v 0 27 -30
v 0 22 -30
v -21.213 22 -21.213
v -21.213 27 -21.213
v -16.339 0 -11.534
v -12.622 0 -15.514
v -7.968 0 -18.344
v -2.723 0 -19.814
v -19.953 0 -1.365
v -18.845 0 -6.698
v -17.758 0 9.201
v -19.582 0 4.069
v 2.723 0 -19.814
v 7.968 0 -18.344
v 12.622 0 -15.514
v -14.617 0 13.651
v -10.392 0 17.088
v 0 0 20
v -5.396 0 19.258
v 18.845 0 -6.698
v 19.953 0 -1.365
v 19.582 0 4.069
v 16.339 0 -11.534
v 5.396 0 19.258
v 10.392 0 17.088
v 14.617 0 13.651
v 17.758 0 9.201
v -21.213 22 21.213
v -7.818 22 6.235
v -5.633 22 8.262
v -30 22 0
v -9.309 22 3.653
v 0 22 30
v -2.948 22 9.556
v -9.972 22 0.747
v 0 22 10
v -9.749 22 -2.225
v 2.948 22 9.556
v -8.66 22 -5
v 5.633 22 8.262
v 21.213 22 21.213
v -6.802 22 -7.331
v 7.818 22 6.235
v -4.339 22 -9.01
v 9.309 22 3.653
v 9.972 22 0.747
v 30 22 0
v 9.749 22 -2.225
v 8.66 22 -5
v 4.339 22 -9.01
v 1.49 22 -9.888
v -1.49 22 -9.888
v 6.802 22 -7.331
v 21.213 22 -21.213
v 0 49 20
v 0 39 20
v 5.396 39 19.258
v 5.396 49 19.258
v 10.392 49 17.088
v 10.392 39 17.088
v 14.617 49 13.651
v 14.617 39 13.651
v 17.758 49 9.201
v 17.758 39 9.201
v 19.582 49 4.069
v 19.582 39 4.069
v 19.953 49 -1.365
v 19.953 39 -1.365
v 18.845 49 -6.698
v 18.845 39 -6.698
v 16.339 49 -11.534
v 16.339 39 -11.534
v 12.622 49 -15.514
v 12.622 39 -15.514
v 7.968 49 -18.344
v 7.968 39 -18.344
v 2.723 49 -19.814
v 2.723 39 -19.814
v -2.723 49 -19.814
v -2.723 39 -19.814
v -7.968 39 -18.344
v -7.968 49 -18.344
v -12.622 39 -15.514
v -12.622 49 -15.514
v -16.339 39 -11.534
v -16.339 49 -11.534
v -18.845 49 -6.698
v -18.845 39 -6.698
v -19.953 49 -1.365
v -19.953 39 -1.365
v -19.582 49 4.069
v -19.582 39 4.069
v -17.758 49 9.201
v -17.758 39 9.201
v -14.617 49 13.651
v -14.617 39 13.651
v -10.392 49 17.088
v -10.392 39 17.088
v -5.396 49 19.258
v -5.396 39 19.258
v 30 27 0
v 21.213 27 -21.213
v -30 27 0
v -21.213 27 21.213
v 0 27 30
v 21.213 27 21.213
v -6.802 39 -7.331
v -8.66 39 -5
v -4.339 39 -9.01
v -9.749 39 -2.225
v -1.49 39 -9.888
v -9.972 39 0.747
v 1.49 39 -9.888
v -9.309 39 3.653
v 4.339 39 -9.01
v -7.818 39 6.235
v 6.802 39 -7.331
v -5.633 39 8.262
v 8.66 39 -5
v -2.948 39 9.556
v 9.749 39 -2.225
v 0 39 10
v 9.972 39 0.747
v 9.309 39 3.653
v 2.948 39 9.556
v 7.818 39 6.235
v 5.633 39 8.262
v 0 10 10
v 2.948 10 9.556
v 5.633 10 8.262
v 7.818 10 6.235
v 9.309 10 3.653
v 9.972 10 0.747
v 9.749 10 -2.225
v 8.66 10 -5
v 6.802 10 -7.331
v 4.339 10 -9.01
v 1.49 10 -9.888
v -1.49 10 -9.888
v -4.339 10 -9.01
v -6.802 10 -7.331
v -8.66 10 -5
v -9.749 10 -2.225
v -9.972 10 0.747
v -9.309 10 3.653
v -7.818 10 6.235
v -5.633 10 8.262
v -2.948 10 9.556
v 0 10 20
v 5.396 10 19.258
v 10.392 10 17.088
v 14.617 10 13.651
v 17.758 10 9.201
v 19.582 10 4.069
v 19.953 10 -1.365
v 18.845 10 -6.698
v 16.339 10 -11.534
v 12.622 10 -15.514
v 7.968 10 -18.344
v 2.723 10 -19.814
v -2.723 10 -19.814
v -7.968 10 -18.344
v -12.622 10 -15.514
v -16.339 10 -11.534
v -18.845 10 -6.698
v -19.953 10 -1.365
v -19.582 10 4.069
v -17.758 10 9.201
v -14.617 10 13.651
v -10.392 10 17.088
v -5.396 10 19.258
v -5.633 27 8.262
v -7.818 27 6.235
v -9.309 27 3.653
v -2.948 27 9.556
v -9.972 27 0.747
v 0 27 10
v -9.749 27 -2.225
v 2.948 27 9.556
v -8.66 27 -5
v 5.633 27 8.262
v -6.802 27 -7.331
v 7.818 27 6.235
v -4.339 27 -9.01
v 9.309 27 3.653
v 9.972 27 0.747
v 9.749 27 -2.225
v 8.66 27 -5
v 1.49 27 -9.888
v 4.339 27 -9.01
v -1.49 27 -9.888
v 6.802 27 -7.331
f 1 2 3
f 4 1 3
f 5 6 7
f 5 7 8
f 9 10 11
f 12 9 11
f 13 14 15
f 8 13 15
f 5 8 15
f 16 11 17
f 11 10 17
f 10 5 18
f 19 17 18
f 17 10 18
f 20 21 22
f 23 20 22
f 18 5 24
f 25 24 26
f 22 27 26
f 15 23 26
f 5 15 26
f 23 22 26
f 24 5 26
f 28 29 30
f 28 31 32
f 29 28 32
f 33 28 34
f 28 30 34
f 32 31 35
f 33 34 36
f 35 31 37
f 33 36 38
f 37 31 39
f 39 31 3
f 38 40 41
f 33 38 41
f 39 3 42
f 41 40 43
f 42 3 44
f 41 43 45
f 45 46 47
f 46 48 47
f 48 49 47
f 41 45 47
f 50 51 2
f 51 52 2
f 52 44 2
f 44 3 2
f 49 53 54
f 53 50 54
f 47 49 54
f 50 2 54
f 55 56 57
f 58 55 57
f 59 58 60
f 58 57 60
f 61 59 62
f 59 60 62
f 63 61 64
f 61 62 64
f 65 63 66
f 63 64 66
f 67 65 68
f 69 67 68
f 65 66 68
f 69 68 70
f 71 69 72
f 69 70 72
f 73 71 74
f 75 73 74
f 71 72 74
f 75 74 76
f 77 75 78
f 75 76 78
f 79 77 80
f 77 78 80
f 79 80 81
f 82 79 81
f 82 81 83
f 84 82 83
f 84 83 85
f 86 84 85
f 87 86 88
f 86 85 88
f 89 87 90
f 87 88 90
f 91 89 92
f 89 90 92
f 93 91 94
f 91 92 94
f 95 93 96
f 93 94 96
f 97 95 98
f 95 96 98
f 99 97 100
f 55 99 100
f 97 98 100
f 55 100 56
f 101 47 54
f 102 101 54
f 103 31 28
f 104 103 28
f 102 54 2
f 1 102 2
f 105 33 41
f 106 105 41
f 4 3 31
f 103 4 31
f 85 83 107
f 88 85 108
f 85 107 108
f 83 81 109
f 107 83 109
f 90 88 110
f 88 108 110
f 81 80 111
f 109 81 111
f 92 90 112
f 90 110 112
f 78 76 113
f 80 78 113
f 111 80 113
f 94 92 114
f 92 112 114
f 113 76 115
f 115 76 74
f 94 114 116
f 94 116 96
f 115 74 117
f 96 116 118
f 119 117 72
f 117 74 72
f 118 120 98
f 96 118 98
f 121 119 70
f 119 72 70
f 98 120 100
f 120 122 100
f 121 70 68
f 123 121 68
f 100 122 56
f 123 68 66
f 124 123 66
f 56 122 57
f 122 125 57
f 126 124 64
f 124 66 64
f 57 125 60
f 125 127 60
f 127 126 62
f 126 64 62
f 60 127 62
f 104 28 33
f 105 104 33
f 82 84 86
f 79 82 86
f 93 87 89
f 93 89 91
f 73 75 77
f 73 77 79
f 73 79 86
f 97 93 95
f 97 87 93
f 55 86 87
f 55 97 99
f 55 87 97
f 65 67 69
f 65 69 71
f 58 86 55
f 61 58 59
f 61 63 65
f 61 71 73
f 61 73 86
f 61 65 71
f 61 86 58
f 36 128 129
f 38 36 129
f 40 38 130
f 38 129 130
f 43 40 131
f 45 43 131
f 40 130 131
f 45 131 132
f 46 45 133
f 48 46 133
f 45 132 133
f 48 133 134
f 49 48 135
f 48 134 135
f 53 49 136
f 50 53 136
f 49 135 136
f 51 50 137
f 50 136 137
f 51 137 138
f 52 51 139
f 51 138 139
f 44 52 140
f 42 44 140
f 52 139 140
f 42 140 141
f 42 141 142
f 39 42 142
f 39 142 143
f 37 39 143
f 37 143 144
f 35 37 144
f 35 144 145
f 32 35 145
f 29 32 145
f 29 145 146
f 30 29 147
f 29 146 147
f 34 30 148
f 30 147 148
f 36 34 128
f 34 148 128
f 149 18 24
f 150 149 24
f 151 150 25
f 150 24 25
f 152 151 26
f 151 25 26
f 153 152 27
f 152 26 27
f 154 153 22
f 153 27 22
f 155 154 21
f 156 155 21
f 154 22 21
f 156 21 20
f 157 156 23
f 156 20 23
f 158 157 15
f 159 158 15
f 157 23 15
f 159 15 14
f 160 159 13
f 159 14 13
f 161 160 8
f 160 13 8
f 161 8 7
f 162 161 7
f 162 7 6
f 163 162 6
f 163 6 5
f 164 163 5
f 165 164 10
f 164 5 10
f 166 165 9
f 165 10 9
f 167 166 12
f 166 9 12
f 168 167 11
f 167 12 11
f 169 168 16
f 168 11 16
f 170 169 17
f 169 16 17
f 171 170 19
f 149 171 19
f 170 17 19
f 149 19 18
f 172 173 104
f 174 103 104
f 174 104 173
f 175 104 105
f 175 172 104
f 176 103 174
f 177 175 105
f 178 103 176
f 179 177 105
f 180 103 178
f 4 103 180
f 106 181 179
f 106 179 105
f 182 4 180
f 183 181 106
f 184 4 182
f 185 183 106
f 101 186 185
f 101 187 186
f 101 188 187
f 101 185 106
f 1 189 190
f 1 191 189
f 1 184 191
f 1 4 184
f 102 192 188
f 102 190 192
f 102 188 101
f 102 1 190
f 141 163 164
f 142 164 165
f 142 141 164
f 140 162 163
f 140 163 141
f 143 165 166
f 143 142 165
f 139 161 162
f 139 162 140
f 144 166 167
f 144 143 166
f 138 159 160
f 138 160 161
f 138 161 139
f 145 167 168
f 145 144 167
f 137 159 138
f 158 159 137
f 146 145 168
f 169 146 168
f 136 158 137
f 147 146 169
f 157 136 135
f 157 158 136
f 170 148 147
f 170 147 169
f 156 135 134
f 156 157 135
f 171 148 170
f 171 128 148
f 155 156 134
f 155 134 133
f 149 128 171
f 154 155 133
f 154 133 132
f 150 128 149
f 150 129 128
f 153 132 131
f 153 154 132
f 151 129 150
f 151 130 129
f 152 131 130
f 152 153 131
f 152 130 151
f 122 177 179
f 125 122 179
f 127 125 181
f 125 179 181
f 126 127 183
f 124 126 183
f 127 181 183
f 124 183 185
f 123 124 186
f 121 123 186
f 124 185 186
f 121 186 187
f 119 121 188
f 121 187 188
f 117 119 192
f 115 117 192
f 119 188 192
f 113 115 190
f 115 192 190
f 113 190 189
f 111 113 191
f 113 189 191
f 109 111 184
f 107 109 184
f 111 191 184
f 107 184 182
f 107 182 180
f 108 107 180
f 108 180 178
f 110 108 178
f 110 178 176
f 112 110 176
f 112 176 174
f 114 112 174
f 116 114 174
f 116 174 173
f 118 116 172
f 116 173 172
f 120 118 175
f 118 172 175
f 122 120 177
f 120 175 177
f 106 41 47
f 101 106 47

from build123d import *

# Parameters (mm, degrees)
SKETCH2_R           = 20
BOSS_EXTRUDE1_DEPTH = 10
SKETCH3_R           = 10
BOSS_EXTRUDE2_DEPTH = 12
BOSS_EXTRUDE3_DEPTH = 5
SKETCH5_R           = 10
BOSS_EXTRUDE4_DEPTH = 12
SKETCH6_R           = 20
BOSS_EXTRUDE5_DEPTH = 10


with BuildPart() as part:
    # Sketch2 → Boss-Extrude1 (new body)
    with BuildSketch(Plane(origin=(0, 0, 0), x_dir=(1, 0, 0), z_dir=(0, 1, 0))):
        with Locations(Location((0, 0, 0), (0, 0, 270))):
            Circle(SKETCH2_R)
    extrude(amount=BOSS_EXTRUDE1_DEPTH)

    # Sketch3 → Boss-Extrude2 (add)
    with BuildSketch(Plane(origin=(0, 10, 0), x_dir=(1, 0, 0), z_dir=(0, 1, 0))):
        with Locations(Location((0, 0, 0), (0, 0, 270))):
            Circle(SKETCH3_R)
    extrude(amount=BOSS_EXTRUDE2_DEPTH)

    # Sketch4 → Boss-Extrude3 (add)
    with BuildSketch(Plane(origin=(0, 22, 0), x_dir=(1, 0, 0), z_dir=(0, 1, 0))):
        Polygon((30, 0), (21.213203436, 21.213203436), (0, 30), (-21.213203436, 21.213203436), (-30, 0), (-21.213203436, -21.213203436), (0, -30), (21.213203436, -21.213203436), align=None)
    extrude(amount=BOSS_EXTRUDE3_DEPTH)

    # Sketch5 → Boss-Extrude4 (add)
    with BuildSketch(Plane(origin=(0, 27, 0), x_dir=(1, 0, 0), z_dir=(0, 1, 0))):
        with Locations(Location((0, 0, 0), (0, 0, 270))):
            Circle(SKETCH5_R)
    extrude(amount=BOSS_EXTRUDE4_DEPTH)

    # Sketch6 → Boss-Extrude5 (add)
    with BuildSketch(Plane(origin=(0, 39, 0), x_dir=(1, 0, 0), z_dir=(0, 1, 0))):
        with Locations(Location((0, 0, 0), (0, 0, 270))):
            Circle(SKETCH6_R)
    extrude(amount=BOSS_EXTRUDE5_DEPTH)


solid = part.part
